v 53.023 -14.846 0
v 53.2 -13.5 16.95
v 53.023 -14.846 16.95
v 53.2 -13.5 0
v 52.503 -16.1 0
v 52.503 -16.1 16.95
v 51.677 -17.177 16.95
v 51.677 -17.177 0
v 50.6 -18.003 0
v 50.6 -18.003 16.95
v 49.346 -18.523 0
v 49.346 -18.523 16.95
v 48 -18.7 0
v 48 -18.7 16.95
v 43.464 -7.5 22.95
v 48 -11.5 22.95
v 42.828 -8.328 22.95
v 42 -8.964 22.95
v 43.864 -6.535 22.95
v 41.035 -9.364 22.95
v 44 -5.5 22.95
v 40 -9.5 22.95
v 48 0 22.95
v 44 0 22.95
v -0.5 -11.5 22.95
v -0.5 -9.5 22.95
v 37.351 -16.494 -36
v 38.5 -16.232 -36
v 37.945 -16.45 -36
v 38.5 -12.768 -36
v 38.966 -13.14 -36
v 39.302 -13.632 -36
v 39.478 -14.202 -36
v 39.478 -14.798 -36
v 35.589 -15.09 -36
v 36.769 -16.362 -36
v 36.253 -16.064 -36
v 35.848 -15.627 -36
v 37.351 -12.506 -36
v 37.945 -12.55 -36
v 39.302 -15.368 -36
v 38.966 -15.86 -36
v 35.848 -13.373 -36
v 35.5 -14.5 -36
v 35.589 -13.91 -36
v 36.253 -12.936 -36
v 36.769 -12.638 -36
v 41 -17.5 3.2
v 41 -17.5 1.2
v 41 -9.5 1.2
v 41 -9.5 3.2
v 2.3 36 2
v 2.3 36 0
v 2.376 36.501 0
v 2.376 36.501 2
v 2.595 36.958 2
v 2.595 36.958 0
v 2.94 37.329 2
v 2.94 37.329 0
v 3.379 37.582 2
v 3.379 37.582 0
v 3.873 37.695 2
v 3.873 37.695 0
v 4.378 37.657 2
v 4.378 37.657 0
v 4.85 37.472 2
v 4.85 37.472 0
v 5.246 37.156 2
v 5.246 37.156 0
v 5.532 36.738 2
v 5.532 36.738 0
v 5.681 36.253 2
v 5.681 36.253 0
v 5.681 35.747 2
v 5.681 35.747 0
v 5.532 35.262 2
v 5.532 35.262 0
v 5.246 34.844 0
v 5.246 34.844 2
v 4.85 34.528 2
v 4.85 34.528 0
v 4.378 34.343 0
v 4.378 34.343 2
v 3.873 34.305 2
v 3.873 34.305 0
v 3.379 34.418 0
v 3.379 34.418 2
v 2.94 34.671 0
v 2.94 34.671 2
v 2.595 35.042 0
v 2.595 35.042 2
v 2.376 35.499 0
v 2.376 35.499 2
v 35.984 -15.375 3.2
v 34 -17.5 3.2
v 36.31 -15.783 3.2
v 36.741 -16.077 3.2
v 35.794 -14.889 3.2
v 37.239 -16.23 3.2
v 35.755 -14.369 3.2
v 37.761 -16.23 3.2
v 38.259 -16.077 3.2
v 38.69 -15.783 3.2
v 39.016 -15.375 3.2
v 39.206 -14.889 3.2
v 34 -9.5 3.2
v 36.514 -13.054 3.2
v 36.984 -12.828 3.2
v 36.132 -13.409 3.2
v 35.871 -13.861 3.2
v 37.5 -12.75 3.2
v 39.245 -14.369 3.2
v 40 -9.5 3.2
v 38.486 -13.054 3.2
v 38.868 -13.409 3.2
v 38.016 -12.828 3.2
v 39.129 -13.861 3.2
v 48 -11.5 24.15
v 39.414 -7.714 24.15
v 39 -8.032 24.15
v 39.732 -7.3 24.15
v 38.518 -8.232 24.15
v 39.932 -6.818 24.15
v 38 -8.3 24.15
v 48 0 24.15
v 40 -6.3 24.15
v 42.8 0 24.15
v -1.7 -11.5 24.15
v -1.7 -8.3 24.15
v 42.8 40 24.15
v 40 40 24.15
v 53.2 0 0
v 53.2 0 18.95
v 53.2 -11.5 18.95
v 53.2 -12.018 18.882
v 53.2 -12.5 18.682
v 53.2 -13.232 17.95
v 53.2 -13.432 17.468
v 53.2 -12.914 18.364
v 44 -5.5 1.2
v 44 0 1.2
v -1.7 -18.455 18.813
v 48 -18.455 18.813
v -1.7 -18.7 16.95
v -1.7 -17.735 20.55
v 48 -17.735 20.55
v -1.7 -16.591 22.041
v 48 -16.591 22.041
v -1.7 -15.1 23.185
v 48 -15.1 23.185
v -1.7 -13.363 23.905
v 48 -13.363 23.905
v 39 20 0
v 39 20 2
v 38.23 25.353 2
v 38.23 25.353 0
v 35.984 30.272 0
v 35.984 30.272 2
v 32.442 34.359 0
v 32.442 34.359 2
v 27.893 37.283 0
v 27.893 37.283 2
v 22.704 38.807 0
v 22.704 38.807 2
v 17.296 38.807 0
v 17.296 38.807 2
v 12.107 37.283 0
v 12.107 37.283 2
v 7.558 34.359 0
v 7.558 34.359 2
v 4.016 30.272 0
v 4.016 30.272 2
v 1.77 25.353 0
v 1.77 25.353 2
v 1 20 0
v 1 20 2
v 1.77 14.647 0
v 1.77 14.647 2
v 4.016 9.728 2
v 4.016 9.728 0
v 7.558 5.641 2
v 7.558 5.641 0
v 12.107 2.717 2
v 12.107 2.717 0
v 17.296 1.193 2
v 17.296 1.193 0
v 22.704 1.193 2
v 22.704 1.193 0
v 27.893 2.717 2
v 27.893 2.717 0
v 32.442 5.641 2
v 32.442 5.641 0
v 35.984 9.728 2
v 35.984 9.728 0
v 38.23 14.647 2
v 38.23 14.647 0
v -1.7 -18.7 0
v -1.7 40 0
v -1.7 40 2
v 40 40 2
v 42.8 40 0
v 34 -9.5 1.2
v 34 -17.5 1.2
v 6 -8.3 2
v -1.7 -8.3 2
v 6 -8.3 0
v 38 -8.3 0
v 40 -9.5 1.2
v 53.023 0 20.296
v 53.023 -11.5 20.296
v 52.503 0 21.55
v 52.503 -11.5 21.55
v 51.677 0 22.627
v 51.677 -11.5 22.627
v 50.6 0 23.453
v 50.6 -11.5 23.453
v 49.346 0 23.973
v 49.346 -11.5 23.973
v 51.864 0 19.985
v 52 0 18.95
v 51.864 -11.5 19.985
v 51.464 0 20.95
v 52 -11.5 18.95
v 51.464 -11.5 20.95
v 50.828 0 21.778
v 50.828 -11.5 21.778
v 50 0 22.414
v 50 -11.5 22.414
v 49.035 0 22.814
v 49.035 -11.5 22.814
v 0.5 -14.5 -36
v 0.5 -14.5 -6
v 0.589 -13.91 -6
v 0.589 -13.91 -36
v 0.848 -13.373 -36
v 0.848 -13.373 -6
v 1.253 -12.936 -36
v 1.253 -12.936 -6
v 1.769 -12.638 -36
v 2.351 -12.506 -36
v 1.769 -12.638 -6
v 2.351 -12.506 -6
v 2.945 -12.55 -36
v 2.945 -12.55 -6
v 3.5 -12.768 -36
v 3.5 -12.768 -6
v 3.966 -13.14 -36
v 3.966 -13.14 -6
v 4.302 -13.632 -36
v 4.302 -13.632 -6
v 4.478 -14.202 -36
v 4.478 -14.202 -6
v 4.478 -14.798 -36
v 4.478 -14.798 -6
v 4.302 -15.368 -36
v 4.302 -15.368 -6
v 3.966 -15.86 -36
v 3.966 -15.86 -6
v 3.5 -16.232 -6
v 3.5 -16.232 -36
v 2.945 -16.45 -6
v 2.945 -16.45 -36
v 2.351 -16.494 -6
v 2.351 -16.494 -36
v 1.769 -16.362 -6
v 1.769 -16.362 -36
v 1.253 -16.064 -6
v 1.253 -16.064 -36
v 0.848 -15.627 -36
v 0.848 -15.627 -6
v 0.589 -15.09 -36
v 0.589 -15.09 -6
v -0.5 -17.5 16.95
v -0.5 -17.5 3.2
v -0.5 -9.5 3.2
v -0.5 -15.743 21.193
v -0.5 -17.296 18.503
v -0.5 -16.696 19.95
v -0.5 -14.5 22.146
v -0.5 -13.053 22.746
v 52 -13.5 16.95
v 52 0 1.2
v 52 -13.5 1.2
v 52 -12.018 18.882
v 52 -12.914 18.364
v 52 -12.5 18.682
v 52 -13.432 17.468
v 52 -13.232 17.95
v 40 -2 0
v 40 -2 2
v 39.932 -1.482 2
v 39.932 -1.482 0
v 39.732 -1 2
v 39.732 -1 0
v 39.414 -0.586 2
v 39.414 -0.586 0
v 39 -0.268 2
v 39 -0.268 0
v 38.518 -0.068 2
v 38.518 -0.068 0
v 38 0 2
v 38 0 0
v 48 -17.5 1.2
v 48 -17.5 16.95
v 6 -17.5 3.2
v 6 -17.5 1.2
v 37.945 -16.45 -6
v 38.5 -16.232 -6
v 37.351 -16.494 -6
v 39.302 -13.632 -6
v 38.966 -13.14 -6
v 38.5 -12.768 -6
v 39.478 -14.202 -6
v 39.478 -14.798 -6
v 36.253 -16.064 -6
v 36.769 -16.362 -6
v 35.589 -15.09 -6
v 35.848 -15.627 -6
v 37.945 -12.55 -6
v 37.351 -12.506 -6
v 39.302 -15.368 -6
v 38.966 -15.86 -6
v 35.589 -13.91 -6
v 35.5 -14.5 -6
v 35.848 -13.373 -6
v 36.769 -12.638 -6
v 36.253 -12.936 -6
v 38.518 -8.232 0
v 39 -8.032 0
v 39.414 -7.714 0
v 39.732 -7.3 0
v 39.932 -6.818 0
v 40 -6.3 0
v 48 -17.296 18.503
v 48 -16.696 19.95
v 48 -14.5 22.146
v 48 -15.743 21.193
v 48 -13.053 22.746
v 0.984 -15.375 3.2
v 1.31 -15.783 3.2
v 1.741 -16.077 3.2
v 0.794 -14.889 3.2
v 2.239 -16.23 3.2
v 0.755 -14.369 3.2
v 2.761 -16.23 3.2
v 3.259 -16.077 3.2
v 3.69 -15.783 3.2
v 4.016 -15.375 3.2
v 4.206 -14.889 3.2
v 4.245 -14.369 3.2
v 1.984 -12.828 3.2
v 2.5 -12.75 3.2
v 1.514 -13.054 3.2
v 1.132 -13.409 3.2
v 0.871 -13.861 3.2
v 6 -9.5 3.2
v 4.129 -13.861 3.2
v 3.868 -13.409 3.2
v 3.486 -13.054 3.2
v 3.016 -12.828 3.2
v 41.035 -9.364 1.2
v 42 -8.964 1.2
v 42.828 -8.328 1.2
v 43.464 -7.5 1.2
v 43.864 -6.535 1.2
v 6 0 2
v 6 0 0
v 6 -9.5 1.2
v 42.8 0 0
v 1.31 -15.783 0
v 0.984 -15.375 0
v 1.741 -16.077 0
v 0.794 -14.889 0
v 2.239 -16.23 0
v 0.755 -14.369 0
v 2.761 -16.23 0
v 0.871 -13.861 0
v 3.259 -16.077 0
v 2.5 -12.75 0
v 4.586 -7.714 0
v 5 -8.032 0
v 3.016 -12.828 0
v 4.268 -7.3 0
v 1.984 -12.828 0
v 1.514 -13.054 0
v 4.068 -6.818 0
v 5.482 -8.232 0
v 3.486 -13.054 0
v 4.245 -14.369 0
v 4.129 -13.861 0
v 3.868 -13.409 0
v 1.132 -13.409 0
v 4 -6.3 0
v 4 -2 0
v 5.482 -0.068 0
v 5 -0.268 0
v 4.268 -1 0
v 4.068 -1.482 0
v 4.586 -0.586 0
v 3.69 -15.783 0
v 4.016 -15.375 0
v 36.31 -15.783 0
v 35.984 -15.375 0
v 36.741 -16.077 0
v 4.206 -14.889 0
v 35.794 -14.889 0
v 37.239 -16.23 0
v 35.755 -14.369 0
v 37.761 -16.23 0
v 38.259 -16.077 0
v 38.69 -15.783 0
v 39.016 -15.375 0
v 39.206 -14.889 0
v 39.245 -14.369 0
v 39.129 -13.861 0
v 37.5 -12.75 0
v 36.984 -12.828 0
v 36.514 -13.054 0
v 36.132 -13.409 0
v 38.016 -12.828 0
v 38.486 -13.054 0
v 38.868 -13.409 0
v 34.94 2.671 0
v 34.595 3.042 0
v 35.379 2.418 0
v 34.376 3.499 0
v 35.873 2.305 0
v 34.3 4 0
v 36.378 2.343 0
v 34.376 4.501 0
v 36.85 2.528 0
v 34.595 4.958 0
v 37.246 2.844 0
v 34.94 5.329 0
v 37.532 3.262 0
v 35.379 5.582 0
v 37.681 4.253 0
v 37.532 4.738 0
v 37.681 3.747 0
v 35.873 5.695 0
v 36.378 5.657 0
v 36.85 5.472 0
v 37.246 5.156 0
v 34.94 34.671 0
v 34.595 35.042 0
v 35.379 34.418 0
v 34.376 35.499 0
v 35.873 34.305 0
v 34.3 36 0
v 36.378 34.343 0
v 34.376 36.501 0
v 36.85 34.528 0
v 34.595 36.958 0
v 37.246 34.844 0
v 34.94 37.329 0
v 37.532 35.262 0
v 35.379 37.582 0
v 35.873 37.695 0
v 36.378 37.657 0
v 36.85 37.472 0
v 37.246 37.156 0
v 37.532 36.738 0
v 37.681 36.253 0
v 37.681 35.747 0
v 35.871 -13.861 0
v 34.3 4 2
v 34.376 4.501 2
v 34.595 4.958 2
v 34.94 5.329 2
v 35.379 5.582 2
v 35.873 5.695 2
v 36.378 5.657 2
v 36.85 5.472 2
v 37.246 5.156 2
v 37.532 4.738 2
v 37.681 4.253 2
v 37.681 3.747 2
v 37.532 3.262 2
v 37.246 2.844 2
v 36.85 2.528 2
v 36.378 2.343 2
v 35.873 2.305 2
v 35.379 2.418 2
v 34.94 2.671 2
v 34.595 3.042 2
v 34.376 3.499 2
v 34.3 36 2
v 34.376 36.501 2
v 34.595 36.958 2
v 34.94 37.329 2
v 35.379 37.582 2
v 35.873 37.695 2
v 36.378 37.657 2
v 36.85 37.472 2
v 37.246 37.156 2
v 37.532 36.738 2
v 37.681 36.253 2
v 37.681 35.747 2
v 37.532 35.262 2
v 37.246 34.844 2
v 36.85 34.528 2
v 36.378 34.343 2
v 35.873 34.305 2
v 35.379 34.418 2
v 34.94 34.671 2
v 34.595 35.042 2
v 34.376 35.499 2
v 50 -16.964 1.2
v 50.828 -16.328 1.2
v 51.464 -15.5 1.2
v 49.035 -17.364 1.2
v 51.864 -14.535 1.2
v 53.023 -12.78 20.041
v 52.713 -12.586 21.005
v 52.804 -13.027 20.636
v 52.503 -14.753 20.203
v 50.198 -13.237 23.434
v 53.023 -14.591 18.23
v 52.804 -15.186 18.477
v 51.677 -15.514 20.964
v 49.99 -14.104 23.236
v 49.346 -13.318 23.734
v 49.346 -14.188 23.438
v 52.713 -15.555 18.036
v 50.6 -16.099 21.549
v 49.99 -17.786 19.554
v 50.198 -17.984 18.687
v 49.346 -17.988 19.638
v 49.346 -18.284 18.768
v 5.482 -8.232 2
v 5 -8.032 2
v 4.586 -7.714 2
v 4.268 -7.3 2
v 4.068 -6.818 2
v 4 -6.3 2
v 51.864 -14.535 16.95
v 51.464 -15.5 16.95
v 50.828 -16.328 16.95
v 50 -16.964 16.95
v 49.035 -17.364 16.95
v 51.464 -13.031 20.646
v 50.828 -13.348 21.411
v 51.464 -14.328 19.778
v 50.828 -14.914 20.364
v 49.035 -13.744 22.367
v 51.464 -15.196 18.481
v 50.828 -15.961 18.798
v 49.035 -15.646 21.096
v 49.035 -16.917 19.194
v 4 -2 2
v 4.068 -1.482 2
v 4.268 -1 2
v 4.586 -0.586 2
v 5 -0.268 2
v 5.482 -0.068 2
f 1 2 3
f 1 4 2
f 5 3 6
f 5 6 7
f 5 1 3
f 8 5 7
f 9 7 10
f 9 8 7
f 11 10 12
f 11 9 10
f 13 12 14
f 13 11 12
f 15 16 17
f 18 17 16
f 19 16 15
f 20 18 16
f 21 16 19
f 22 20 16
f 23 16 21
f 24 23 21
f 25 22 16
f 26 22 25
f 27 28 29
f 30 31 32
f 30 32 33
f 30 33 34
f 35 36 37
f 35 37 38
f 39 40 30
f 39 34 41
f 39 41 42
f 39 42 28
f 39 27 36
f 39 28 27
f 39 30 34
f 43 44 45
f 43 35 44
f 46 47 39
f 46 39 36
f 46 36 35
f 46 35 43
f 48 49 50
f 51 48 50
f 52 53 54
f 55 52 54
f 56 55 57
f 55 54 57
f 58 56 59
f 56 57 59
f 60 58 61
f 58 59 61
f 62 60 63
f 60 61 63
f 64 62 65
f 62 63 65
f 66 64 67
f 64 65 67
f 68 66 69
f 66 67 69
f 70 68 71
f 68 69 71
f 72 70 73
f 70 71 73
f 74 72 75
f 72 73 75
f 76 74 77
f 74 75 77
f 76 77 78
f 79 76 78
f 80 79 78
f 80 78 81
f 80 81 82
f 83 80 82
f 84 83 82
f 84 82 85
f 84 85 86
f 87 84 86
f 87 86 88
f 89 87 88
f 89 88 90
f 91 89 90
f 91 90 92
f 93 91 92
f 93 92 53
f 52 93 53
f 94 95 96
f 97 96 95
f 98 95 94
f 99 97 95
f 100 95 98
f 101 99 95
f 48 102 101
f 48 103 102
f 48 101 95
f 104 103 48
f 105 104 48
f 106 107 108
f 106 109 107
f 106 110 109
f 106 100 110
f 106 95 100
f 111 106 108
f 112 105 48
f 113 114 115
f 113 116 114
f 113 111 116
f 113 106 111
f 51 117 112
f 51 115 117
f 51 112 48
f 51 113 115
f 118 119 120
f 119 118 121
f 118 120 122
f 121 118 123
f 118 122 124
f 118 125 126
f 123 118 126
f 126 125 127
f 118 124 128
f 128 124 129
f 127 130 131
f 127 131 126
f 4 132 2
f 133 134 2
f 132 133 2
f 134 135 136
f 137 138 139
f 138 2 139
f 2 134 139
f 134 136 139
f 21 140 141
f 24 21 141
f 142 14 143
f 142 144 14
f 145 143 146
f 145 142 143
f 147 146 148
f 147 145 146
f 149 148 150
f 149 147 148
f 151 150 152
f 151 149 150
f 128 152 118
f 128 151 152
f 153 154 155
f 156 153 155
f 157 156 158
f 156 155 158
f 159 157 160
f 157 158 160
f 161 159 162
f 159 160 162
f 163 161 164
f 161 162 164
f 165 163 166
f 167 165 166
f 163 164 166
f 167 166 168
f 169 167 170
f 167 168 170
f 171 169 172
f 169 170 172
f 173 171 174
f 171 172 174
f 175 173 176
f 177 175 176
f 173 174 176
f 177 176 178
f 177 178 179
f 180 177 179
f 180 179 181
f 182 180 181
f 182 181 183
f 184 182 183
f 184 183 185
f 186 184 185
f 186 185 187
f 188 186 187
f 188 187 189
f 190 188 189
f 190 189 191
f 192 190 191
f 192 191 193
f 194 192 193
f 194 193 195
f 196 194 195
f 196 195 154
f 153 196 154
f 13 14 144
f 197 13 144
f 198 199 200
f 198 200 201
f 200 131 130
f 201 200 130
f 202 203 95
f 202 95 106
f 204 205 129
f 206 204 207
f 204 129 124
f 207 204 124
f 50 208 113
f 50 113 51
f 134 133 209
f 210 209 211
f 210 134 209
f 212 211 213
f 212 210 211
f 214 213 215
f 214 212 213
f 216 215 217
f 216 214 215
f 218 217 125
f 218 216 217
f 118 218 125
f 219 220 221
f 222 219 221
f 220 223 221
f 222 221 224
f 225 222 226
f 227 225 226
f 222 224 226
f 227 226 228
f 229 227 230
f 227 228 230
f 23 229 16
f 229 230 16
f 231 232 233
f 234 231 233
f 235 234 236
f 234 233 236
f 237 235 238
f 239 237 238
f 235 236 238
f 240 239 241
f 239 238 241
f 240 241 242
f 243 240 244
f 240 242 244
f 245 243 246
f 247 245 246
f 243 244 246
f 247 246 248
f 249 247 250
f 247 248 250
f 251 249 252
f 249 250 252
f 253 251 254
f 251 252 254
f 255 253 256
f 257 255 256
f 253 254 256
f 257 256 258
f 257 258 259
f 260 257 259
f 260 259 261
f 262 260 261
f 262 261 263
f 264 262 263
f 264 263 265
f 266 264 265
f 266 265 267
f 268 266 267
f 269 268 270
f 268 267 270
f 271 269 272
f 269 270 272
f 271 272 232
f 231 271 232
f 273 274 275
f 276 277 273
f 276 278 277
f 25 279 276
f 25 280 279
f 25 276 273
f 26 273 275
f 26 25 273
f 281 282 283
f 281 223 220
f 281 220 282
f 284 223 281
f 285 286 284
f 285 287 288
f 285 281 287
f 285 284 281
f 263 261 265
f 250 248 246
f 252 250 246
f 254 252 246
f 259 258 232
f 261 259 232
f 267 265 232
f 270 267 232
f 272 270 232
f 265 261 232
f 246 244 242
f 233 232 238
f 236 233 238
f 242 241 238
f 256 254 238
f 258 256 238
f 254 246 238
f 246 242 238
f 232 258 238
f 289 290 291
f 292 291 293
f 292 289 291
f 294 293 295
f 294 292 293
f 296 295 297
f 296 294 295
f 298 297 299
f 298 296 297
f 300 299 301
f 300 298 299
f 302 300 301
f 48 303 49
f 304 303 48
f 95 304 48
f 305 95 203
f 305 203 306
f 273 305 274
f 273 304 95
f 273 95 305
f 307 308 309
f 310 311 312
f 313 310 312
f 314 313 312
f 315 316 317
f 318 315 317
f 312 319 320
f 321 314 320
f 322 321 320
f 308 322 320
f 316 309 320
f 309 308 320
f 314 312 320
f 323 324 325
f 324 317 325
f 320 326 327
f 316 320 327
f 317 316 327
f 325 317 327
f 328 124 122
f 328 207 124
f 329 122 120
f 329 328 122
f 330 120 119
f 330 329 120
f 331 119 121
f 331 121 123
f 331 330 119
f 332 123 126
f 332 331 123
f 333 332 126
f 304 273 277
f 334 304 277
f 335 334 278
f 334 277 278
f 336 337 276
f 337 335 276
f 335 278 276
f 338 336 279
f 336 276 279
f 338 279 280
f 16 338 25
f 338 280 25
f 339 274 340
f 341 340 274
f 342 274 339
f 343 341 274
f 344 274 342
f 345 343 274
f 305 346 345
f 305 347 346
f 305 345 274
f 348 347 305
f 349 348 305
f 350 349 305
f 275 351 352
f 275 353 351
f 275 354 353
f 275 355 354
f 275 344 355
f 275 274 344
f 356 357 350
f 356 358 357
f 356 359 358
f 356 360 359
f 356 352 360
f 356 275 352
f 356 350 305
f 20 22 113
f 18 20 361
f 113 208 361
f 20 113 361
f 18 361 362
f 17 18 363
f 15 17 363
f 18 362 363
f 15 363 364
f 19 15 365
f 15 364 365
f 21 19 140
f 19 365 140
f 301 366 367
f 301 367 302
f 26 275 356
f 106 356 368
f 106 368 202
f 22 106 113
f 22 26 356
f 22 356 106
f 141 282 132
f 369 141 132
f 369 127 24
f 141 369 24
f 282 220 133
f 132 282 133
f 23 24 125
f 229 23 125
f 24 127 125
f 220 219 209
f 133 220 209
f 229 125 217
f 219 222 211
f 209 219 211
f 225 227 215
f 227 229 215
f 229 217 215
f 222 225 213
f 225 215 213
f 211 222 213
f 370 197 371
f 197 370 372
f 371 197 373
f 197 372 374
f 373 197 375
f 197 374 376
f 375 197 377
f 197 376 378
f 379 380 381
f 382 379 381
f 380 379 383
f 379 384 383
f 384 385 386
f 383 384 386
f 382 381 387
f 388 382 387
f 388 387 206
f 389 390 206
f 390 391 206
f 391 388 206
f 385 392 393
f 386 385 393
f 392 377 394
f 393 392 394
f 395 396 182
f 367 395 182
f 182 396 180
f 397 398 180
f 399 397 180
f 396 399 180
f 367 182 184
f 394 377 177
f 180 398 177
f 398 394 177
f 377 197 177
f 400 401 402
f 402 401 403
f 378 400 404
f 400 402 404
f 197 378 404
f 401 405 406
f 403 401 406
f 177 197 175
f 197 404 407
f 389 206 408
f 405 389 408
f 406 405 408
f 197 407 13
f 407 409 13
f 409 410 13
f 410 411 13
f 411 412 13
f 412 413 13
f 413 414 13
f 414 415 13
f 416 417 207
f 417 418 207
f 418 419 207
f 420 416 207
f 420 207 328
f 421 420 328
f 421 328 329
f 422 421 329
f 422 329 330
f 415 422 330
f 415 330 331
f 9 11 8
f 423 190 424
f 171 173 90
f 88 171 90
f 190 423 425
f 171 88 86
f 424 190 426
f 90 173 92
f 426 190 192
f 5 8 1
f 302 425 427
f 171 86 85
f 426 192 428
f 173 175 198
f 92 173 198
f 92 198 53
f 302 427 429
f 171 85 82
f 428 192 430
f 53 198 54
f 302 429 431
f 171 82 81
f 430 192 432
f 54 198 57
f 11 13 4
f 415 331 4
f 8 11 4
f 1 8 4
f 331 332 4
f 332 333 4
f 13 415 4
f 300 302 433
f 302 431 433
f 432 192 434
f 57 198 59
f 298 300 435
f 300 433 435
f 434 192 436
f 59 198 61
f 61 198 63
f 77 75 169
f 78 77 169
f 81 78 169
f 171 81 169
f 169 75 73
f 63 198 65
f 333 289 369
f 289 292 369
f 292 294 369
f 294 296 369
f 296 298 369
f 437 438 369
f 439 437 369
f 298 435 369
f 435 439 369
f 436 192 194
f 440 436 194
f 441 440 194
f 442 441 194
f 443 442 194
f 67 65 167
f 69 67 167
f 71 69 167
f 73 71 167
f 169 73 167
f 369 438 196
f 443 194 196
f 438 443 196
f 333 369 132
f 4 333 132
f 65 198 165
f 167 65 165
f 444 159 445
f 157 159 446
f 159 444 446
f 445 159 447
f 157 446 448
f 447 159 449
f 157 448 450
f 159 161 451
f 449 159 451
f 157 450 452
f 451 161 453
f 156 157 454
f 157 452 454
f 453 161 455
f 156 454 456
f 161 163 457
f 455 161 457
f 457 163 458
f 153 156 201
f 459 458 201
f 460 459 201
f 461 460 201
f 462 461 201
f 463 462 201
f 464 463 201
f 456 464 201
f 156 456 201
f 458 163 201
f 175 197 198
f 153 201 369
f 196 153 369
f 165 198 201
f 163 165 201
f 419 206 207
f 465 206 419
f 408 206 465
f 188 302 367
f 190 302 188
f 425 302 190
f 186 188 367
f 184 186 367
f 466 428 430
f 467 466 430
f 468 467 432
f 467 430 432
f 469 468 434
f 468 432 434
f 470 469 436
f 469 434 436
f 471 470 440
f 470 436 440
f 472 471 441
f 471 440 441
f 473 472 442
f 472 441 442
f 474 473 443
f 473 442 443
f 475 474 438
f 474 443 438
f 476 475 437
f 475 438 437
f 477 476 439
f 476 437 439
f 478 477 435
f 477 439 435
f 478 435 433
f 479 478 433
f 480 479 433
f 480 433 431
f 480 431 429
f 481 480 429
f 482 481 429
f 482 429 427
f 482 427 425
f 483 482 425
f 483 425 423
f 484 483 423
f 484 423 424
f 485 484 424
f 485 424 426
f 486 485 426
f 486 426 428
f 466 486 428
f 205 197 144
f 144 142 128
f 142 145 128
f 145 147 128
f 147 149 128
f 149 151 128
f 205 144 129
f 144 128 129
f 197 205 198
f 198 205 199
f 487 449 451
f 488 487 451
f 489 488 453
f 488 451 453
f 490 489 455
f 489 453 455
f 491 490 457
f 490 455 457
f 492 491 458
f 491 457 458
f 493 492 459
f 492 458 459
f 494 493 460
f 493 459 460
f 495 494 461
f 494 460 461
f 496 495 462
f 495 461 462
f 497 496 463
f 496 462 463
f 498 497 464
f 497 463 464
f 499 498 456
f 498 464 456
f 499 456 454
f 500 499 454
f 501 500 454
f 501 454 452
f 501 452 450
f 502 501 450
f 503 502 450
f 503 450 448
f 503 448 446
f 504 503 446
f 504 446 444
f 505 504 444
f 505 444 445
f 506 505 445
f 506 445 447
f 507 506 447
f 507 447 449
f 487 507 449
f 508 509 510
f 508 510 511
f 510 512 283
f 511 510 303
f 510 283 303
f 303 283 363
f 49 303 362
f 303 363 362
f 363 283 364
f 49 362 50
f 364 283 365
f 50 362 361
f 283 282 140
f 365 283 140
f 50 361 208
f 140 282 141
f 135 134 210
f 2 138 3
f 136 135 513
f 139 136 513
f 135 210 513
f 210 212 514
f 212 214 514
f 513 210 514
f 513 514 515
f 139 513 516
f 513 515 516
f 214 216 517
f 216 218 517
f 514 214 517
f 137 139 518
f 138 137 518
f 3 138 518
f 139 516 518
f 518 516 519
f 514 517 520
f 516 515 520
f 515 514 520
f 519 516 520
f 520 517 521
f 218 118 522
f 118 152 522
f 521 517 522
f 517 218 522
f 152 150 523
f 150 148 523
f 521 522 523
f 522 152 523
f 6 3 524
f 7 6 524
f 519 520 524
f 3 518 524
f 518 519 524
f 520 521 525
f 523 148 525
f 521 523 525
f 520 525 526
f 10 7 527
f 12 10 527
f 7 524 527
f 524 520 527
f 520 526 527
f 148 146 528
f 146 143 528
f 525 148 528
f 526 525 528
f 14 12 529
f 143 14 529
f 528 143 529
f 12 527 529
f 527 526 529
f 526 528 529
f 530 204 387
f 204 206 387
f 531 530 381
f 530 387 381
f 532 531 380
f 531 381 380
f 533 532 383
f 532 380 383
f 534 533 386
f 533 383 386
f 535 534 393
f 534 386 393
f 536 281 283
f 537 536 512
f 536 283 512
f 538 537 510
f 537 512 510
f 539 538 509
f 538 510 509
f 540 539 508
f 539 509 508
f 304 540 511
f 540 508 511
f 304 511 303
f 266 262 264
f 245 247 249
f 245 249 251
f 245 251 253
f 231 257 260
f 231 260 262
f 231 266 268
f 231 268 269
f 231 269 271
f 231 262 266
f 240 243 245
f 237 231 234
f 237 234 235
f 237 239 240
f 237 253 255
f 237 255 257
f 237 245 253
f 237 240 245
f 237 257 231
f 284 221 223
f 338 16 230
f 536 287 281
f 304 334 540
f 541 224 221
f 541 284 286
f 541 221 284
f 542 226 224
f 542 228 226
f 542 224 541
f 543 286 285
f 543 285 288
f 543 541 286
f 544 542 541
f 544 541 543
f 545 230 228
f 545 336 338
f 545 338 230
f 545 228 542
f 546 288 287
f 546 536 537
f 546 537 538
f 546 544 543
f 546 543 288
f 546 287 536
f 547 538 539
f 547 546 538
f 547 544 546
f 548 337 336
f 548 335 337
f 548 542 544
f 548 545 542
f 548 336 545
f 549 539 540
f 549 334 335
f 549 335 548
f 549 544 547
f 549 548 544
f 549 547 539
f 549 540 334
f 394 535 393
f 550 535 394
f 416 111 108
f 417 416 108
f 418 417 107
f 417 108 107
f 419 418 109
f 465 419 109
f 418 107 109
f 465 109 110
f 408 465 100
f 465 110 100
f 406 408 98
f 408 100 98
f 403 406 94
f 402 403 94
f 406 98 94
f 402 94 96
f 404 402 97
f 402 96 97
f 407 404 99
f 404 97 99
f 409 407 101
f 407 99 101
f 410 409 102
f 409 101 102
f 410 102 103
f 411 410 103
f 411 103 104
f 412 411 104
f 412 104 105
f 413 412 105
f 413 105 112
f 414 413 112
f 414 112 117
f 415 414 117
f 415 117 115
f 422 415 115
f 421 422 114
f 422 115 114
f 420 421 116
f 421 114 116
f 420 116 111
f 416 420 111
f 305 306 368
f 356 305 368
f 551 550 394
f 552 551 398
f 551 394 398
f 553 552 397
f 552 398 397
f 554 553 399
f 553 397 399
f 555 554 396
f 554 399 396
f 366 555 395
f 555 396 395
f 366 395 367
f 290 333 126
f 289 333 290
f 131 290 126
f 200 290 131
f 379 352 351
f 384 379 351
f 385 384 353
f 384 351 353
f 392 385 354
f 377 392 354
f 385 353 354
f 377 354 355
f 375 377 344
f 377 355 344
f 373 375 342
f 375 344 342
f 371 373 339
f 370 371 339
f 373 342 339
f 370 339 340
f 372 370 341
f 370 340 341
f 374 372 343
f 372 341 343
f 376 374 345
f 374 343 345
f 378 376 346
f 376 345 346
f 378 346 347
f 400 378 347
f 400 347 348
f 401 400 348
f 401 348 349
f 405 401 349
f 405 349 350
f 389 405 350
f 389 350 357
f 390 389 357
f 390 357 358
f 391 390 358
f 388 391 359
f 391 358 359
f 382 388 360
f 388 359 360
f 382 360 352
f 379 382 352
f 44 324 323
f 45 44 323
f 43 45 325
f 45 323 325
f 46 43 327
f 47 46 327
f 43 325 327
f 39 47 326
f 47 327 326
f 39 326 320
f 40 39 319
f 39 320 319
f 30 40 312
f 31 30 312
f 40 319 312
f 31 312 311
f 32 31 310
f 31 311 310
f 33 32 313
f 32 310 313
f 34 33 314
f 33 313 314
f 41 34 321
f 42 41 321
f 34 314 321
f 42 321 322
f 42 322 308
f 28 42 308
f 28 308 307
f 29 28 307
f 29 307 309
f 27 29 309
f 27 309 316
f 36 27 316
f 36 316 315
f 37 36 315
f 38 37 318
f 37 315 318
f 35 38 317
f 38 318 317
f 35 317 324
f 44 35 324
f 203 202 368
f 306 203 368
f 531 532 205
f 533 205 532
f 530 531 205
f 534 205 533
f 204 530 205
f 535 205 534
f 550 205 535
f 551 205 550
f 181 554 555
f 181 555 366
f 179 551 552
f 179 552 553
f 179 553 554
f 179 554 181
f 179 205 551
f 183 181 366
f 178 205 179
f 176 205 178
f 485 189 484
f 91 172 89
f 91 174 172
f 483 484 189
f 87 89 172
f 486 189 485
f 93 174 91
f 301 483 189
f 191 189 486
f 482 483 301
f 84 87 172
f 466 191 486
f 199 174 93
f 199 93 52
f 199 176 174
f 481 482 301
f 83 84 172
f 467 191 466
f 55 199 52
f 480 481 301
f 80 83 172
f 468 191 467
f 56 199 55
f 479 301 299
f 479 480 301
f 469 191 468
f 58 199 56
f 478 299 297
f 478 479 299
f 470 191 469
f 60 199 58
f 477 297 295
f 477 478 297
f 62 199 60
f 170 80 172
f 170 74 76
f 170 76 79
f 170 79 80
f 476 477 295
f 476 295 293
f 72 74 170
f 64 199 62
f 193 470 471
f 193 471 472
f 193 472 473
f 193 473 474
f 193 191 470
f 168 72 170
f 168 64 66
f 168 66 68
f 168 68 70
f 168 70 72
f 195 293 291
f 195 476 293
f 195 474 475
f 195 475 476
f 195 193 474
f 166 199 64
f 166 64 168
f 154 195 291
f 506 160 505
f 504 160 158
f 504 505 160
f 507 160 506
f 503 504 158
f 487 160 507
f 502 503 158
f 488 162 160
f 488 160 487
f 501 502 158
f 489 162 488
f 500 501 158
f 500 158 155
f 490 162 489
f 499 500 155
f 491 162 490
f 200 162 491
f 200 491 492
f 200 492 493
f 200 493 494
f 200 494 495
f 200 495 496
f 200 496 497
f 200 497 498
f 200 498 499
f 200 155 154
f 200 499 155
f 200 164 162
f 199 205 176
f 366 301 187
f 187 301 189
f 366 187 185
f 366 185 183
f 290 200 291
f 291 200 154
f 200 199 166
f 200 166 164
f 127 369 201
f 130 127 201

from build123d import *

# Parameters (mm, degrees)
SKETCH1_W                           = 40
SKETCH1_H                           = 40
BOSS_EXTRUDE1_DEPTH                 = 2
M3_CLEARANCE_HOLE1_D                = 3.4
SKETCH10_W                          = 40
SKETCH10_H                          = 8.3
BOSS_EXTRUDE7_DEPTH                 = 2
BOSS_EXTRUDE10_START                = 6
SKETCH20_R                          = 2
BOSS_EXTRUDE10_DEPTH                = 30
BOSS_EXTRUDE10_2_DEPTH              = 30
BOSS_EXTRUDE11_DEPTH                = 21.75
FILLET4_R                           = 6
FILLET1_R                           = 4
SHELL1_T                            = 1.2
SKETCH25_W                          = 2.8
SKETCH25_H                          = 48.3
BOSS_EXTRUDE14_DEPTH                = 24.15
SKETCH26_W                          = 36
SKETCH26_H                          = 8.3
CUT_EXTRUDE5_DEPTH                  = 77.64359073
SKETCH27_R                          = 19
CUT_EXTRUDE6_DEPTH                  = 77.64359073
FILLET2_R                           = 2
FILLET3_R                           = 2
SKETCH29_W                          = 1.7
SKETCH29_H                          = 48.3
BOSS_EXTRUDE15_DEPTH                = 2
DELETEFACE1_OUTLINE_R               = 1.7
DELETEFACE1_DEPTH                   = 2
SKETCH32_W                          = 7
SKETCH32_H                          = 8
BOSS_EXTRUDE16_DEPTH                = 2
SKETCH31_W                          = 1.75
SKETCH31_H                          = 3.201
F_3_5_3_5_DIAMETER_HOLE1_AT_2_COUNT = 2
F_3_5_3_5_DIAMETER_HOLE1_AT_2_PITCH = 35


# Read off the part's stored shape, not the designer's step: DeleteFace1
with BuildPart() as part:
    # Sketch1 → Boss-Extrude1 (new body)
    with BuildSketch(Plane.XY):
        with Locations((20, 20)):
            Rectangle(SKETCH1_W, SKETCH1_H)
    extrude(amount=BOSS_EXTRUDE1_DEPTH)

    # M3 Clearance Hole1 (through all)
    with Locations(Plane.XY.offset(2)):
        with Locations((4, 36), (36, 4), (4, 4), (36, 36)):
            Hole(M3_CLEARANCE_HOLE1_D / 2)

    # Sketch10 → Boss-Extrude7 (add)
    with BuildSketch(Plane.XY.offset(2)):
        with Locations((20, -4.15)):
            Rectangle(SKETCH10_W, SKETCH10_H)
    extrude(amount=-BOSS_EXTRUDE7_DEPTH)



with BuildPart() as body_2:
    # Sketch20 → Boss-Extrude10 (new body)
    with BuildSketch(Plane(origin=(0, 0, 0), x_dir=(-1, 0, 0), z_dir=(0, 0, -1)).offset(BOSS_EXTRUDE10_START)):
        with Locations((-37.5, -14.5)):
            Circle(SKETCH20_R)
    extrude(amount=BOSS_EXTRUDE10_DEPTH)


with BuildPart() as body_3:
    # Sketch20 → Boss-Extrude10 2 (new body)
    with BuildSketch(Plane(origin=(0, 0, 0), x_dir=(-1, 0, 0), z_dir=(0, 0, -1)).offset(BOSS_EXTRUDE10_START)):
        with Locations((-2.5, -14.5)):
            Circle(SKETCH20_R)
    extrude(amount=BOSS_EXTRUDE10_2_DEPTH)


with BuildPart() as body_4:
    # Sketch22 → Boss-Extrude11 (new body)
    with BuildSketch(Plane(origin=(0, 0, 22.95), x_dir=(-1, 0, 0), z_dir=(0, 0, -1))):
        Polygon((-44, 0), (-52, 0), (-52, -17.5), (0.5, -17.5), (0.5, -9.5), (-44, -9.5), align=None)
    extrude(amount=BOSS_EXTRUDE11_DEPTH)

    # Fillet4
    fillet4_edges = [body_4.edges().sort_by_distance(p)[0] for p in [
        (25.75, -17.5, 22.95),
    ]]
    fillet(fillet4_edges, radius=FILLET4_R)

    # Fillet1
    fillet1_edges = [body_4.edges().sort_by_distance(p)[0] for p in [
        (44, -9.5, 12.075),
        (52, -17.5, 9.075),
        (52, -15.742640687, 21.192640687),
        (52, -5.75, 22.95),
    ]]
    fillet(fillet1_edges, radius=FILLET1_R)

    # Shell1
    shell1_openings = [body_4.faces().sort_by_distance(p)[0] for p in [
        (47.937463249, 0, 11.874064326),
    ]]
    offset(amount=SHELL1_T, openings=shell1_openings, kind=Kind.INTERSECTION)


with BuildPart() as part_1:
    add(part.part)

    add(body_4.part)  # Boss-Extrude14 merges body 4
    # Sketch25 → Boss-Extrude14 (add)
    with BuildSketch(Plane(origin=(0, 0, 0), x_dir=(-1, 0, 0), z_dir=(0, 0, -1))):
        with Locations((-41.4, 15.85)):
            Rectangle(SKETCH25_W, SKETCH25_H)
    extrude(amount=-BOSS_EXTRUDE14_DEPTH)

    # Sketch26 → Cut-Extrude5 (cut, through all)
    with BuildSketch(Plane.XY.offset(2)):
        with Locations((22, -4.15)):
            Rectangle(SKETCH26_W, SKETCH26_H)
    extrude(amount=-CUT_EXTRUDE5_DEPTH, mode=Mode.SUBTRACT)

    # Sketch27 → Cut-Extrude6 (cut, through all)
    with BuildSketch(Plane.XY.offset(2)):
        with Locations((20, 20)):
            Circle(SKETCH27_R)
    extrude(amount=-CUT_EXTRUDE6_DEPTH, mode=Mode.SUBTRACT)

    # Fillet2
    fillet2_edges = [part_1.edges().sort_by_distance(p)[0] for p in [
        (4, 0, 1),
        (40, 0, 1),
        (4, -8.3, 1),
    ]]
    fillet(fillet2_edges, radius=FILLET2_R)

    # Fillet3
    fillet3_edges = [part_1.edges().sort_by_distance(p)[0] for p in [
        (40, -8.3, 12.075),
    ]]
    fillet(fillet3_edges, radius=FILLET3_R)

    # Sketch29 → Boss-Extrude15 (add)
    with BuildSketch(Plane.XY.offset(2)):
        with Locations((-0.85, 15.85)):
            Rectangle(SKETCH29_W, SKETCH29_H)
    extrude(amount=-BOSS_EXTRUDE15_DEPTH)

    # DeleteFace1 outline → DeleteFace1 (add)
    with BuildSketch(Plane.XY):
        with Locations((4, 4)):
            Circle(DELETEFACE1_OUTLINE_R)
    extrude(amount=DELETEFACE1_DEPTH)

    # Sketch32 → Boss-Extrude16 (add)
    with BuildSketch(Plane.XY.offset(1.2)):
        with Locations((2.5, -13.5)):
            Rectangle(SKETCH32_W, SKETCH32_H)
        with Locations((37.5, -13.5)):
            Rectangle(SKETCH32_W, SKETCH32_H)
    extrude(amount=BOSS_EXTRUDE16_DEPTH)

    # Sketch31 → Ø3.5 (3.5) Diameter Hole1 (revolve, cut)
    with BuildSketch(Plane(origin=(37.5, -14.5, 0), x_dir=(0, 1, 0), z_dir=(1, 0, 0))):
        with Locations((0.875, 1.6005)):
            Rectangle(SKETCH31_W, SKETCH31_H)
    f_3_5_3_5_diameter_hole1 = revolve(axis=Axis((37.5, -14.5, -6.35), (0, 0, 1)), mode=Mode.SUBTRACT)

    # Ø3.5 (3.5) Diameter Hole1 at 2: Ø3.5 (3.5) Diameter Hole1 ×2
    with Locations(*[(-i * F_3_5_3_5_DIAMETER_HOLE1_AT_2_PITCH, 0, 0) for i in range(1, F_3_5_3_5_DIAMETER_HOLE1_AT_2_COUNT)]):
        add(f_3_5_3_5_diameter_hole1, mode=Mode.SUBTRACT)


solid = Compound([body_2.part, body_3.part, part_1.part])
